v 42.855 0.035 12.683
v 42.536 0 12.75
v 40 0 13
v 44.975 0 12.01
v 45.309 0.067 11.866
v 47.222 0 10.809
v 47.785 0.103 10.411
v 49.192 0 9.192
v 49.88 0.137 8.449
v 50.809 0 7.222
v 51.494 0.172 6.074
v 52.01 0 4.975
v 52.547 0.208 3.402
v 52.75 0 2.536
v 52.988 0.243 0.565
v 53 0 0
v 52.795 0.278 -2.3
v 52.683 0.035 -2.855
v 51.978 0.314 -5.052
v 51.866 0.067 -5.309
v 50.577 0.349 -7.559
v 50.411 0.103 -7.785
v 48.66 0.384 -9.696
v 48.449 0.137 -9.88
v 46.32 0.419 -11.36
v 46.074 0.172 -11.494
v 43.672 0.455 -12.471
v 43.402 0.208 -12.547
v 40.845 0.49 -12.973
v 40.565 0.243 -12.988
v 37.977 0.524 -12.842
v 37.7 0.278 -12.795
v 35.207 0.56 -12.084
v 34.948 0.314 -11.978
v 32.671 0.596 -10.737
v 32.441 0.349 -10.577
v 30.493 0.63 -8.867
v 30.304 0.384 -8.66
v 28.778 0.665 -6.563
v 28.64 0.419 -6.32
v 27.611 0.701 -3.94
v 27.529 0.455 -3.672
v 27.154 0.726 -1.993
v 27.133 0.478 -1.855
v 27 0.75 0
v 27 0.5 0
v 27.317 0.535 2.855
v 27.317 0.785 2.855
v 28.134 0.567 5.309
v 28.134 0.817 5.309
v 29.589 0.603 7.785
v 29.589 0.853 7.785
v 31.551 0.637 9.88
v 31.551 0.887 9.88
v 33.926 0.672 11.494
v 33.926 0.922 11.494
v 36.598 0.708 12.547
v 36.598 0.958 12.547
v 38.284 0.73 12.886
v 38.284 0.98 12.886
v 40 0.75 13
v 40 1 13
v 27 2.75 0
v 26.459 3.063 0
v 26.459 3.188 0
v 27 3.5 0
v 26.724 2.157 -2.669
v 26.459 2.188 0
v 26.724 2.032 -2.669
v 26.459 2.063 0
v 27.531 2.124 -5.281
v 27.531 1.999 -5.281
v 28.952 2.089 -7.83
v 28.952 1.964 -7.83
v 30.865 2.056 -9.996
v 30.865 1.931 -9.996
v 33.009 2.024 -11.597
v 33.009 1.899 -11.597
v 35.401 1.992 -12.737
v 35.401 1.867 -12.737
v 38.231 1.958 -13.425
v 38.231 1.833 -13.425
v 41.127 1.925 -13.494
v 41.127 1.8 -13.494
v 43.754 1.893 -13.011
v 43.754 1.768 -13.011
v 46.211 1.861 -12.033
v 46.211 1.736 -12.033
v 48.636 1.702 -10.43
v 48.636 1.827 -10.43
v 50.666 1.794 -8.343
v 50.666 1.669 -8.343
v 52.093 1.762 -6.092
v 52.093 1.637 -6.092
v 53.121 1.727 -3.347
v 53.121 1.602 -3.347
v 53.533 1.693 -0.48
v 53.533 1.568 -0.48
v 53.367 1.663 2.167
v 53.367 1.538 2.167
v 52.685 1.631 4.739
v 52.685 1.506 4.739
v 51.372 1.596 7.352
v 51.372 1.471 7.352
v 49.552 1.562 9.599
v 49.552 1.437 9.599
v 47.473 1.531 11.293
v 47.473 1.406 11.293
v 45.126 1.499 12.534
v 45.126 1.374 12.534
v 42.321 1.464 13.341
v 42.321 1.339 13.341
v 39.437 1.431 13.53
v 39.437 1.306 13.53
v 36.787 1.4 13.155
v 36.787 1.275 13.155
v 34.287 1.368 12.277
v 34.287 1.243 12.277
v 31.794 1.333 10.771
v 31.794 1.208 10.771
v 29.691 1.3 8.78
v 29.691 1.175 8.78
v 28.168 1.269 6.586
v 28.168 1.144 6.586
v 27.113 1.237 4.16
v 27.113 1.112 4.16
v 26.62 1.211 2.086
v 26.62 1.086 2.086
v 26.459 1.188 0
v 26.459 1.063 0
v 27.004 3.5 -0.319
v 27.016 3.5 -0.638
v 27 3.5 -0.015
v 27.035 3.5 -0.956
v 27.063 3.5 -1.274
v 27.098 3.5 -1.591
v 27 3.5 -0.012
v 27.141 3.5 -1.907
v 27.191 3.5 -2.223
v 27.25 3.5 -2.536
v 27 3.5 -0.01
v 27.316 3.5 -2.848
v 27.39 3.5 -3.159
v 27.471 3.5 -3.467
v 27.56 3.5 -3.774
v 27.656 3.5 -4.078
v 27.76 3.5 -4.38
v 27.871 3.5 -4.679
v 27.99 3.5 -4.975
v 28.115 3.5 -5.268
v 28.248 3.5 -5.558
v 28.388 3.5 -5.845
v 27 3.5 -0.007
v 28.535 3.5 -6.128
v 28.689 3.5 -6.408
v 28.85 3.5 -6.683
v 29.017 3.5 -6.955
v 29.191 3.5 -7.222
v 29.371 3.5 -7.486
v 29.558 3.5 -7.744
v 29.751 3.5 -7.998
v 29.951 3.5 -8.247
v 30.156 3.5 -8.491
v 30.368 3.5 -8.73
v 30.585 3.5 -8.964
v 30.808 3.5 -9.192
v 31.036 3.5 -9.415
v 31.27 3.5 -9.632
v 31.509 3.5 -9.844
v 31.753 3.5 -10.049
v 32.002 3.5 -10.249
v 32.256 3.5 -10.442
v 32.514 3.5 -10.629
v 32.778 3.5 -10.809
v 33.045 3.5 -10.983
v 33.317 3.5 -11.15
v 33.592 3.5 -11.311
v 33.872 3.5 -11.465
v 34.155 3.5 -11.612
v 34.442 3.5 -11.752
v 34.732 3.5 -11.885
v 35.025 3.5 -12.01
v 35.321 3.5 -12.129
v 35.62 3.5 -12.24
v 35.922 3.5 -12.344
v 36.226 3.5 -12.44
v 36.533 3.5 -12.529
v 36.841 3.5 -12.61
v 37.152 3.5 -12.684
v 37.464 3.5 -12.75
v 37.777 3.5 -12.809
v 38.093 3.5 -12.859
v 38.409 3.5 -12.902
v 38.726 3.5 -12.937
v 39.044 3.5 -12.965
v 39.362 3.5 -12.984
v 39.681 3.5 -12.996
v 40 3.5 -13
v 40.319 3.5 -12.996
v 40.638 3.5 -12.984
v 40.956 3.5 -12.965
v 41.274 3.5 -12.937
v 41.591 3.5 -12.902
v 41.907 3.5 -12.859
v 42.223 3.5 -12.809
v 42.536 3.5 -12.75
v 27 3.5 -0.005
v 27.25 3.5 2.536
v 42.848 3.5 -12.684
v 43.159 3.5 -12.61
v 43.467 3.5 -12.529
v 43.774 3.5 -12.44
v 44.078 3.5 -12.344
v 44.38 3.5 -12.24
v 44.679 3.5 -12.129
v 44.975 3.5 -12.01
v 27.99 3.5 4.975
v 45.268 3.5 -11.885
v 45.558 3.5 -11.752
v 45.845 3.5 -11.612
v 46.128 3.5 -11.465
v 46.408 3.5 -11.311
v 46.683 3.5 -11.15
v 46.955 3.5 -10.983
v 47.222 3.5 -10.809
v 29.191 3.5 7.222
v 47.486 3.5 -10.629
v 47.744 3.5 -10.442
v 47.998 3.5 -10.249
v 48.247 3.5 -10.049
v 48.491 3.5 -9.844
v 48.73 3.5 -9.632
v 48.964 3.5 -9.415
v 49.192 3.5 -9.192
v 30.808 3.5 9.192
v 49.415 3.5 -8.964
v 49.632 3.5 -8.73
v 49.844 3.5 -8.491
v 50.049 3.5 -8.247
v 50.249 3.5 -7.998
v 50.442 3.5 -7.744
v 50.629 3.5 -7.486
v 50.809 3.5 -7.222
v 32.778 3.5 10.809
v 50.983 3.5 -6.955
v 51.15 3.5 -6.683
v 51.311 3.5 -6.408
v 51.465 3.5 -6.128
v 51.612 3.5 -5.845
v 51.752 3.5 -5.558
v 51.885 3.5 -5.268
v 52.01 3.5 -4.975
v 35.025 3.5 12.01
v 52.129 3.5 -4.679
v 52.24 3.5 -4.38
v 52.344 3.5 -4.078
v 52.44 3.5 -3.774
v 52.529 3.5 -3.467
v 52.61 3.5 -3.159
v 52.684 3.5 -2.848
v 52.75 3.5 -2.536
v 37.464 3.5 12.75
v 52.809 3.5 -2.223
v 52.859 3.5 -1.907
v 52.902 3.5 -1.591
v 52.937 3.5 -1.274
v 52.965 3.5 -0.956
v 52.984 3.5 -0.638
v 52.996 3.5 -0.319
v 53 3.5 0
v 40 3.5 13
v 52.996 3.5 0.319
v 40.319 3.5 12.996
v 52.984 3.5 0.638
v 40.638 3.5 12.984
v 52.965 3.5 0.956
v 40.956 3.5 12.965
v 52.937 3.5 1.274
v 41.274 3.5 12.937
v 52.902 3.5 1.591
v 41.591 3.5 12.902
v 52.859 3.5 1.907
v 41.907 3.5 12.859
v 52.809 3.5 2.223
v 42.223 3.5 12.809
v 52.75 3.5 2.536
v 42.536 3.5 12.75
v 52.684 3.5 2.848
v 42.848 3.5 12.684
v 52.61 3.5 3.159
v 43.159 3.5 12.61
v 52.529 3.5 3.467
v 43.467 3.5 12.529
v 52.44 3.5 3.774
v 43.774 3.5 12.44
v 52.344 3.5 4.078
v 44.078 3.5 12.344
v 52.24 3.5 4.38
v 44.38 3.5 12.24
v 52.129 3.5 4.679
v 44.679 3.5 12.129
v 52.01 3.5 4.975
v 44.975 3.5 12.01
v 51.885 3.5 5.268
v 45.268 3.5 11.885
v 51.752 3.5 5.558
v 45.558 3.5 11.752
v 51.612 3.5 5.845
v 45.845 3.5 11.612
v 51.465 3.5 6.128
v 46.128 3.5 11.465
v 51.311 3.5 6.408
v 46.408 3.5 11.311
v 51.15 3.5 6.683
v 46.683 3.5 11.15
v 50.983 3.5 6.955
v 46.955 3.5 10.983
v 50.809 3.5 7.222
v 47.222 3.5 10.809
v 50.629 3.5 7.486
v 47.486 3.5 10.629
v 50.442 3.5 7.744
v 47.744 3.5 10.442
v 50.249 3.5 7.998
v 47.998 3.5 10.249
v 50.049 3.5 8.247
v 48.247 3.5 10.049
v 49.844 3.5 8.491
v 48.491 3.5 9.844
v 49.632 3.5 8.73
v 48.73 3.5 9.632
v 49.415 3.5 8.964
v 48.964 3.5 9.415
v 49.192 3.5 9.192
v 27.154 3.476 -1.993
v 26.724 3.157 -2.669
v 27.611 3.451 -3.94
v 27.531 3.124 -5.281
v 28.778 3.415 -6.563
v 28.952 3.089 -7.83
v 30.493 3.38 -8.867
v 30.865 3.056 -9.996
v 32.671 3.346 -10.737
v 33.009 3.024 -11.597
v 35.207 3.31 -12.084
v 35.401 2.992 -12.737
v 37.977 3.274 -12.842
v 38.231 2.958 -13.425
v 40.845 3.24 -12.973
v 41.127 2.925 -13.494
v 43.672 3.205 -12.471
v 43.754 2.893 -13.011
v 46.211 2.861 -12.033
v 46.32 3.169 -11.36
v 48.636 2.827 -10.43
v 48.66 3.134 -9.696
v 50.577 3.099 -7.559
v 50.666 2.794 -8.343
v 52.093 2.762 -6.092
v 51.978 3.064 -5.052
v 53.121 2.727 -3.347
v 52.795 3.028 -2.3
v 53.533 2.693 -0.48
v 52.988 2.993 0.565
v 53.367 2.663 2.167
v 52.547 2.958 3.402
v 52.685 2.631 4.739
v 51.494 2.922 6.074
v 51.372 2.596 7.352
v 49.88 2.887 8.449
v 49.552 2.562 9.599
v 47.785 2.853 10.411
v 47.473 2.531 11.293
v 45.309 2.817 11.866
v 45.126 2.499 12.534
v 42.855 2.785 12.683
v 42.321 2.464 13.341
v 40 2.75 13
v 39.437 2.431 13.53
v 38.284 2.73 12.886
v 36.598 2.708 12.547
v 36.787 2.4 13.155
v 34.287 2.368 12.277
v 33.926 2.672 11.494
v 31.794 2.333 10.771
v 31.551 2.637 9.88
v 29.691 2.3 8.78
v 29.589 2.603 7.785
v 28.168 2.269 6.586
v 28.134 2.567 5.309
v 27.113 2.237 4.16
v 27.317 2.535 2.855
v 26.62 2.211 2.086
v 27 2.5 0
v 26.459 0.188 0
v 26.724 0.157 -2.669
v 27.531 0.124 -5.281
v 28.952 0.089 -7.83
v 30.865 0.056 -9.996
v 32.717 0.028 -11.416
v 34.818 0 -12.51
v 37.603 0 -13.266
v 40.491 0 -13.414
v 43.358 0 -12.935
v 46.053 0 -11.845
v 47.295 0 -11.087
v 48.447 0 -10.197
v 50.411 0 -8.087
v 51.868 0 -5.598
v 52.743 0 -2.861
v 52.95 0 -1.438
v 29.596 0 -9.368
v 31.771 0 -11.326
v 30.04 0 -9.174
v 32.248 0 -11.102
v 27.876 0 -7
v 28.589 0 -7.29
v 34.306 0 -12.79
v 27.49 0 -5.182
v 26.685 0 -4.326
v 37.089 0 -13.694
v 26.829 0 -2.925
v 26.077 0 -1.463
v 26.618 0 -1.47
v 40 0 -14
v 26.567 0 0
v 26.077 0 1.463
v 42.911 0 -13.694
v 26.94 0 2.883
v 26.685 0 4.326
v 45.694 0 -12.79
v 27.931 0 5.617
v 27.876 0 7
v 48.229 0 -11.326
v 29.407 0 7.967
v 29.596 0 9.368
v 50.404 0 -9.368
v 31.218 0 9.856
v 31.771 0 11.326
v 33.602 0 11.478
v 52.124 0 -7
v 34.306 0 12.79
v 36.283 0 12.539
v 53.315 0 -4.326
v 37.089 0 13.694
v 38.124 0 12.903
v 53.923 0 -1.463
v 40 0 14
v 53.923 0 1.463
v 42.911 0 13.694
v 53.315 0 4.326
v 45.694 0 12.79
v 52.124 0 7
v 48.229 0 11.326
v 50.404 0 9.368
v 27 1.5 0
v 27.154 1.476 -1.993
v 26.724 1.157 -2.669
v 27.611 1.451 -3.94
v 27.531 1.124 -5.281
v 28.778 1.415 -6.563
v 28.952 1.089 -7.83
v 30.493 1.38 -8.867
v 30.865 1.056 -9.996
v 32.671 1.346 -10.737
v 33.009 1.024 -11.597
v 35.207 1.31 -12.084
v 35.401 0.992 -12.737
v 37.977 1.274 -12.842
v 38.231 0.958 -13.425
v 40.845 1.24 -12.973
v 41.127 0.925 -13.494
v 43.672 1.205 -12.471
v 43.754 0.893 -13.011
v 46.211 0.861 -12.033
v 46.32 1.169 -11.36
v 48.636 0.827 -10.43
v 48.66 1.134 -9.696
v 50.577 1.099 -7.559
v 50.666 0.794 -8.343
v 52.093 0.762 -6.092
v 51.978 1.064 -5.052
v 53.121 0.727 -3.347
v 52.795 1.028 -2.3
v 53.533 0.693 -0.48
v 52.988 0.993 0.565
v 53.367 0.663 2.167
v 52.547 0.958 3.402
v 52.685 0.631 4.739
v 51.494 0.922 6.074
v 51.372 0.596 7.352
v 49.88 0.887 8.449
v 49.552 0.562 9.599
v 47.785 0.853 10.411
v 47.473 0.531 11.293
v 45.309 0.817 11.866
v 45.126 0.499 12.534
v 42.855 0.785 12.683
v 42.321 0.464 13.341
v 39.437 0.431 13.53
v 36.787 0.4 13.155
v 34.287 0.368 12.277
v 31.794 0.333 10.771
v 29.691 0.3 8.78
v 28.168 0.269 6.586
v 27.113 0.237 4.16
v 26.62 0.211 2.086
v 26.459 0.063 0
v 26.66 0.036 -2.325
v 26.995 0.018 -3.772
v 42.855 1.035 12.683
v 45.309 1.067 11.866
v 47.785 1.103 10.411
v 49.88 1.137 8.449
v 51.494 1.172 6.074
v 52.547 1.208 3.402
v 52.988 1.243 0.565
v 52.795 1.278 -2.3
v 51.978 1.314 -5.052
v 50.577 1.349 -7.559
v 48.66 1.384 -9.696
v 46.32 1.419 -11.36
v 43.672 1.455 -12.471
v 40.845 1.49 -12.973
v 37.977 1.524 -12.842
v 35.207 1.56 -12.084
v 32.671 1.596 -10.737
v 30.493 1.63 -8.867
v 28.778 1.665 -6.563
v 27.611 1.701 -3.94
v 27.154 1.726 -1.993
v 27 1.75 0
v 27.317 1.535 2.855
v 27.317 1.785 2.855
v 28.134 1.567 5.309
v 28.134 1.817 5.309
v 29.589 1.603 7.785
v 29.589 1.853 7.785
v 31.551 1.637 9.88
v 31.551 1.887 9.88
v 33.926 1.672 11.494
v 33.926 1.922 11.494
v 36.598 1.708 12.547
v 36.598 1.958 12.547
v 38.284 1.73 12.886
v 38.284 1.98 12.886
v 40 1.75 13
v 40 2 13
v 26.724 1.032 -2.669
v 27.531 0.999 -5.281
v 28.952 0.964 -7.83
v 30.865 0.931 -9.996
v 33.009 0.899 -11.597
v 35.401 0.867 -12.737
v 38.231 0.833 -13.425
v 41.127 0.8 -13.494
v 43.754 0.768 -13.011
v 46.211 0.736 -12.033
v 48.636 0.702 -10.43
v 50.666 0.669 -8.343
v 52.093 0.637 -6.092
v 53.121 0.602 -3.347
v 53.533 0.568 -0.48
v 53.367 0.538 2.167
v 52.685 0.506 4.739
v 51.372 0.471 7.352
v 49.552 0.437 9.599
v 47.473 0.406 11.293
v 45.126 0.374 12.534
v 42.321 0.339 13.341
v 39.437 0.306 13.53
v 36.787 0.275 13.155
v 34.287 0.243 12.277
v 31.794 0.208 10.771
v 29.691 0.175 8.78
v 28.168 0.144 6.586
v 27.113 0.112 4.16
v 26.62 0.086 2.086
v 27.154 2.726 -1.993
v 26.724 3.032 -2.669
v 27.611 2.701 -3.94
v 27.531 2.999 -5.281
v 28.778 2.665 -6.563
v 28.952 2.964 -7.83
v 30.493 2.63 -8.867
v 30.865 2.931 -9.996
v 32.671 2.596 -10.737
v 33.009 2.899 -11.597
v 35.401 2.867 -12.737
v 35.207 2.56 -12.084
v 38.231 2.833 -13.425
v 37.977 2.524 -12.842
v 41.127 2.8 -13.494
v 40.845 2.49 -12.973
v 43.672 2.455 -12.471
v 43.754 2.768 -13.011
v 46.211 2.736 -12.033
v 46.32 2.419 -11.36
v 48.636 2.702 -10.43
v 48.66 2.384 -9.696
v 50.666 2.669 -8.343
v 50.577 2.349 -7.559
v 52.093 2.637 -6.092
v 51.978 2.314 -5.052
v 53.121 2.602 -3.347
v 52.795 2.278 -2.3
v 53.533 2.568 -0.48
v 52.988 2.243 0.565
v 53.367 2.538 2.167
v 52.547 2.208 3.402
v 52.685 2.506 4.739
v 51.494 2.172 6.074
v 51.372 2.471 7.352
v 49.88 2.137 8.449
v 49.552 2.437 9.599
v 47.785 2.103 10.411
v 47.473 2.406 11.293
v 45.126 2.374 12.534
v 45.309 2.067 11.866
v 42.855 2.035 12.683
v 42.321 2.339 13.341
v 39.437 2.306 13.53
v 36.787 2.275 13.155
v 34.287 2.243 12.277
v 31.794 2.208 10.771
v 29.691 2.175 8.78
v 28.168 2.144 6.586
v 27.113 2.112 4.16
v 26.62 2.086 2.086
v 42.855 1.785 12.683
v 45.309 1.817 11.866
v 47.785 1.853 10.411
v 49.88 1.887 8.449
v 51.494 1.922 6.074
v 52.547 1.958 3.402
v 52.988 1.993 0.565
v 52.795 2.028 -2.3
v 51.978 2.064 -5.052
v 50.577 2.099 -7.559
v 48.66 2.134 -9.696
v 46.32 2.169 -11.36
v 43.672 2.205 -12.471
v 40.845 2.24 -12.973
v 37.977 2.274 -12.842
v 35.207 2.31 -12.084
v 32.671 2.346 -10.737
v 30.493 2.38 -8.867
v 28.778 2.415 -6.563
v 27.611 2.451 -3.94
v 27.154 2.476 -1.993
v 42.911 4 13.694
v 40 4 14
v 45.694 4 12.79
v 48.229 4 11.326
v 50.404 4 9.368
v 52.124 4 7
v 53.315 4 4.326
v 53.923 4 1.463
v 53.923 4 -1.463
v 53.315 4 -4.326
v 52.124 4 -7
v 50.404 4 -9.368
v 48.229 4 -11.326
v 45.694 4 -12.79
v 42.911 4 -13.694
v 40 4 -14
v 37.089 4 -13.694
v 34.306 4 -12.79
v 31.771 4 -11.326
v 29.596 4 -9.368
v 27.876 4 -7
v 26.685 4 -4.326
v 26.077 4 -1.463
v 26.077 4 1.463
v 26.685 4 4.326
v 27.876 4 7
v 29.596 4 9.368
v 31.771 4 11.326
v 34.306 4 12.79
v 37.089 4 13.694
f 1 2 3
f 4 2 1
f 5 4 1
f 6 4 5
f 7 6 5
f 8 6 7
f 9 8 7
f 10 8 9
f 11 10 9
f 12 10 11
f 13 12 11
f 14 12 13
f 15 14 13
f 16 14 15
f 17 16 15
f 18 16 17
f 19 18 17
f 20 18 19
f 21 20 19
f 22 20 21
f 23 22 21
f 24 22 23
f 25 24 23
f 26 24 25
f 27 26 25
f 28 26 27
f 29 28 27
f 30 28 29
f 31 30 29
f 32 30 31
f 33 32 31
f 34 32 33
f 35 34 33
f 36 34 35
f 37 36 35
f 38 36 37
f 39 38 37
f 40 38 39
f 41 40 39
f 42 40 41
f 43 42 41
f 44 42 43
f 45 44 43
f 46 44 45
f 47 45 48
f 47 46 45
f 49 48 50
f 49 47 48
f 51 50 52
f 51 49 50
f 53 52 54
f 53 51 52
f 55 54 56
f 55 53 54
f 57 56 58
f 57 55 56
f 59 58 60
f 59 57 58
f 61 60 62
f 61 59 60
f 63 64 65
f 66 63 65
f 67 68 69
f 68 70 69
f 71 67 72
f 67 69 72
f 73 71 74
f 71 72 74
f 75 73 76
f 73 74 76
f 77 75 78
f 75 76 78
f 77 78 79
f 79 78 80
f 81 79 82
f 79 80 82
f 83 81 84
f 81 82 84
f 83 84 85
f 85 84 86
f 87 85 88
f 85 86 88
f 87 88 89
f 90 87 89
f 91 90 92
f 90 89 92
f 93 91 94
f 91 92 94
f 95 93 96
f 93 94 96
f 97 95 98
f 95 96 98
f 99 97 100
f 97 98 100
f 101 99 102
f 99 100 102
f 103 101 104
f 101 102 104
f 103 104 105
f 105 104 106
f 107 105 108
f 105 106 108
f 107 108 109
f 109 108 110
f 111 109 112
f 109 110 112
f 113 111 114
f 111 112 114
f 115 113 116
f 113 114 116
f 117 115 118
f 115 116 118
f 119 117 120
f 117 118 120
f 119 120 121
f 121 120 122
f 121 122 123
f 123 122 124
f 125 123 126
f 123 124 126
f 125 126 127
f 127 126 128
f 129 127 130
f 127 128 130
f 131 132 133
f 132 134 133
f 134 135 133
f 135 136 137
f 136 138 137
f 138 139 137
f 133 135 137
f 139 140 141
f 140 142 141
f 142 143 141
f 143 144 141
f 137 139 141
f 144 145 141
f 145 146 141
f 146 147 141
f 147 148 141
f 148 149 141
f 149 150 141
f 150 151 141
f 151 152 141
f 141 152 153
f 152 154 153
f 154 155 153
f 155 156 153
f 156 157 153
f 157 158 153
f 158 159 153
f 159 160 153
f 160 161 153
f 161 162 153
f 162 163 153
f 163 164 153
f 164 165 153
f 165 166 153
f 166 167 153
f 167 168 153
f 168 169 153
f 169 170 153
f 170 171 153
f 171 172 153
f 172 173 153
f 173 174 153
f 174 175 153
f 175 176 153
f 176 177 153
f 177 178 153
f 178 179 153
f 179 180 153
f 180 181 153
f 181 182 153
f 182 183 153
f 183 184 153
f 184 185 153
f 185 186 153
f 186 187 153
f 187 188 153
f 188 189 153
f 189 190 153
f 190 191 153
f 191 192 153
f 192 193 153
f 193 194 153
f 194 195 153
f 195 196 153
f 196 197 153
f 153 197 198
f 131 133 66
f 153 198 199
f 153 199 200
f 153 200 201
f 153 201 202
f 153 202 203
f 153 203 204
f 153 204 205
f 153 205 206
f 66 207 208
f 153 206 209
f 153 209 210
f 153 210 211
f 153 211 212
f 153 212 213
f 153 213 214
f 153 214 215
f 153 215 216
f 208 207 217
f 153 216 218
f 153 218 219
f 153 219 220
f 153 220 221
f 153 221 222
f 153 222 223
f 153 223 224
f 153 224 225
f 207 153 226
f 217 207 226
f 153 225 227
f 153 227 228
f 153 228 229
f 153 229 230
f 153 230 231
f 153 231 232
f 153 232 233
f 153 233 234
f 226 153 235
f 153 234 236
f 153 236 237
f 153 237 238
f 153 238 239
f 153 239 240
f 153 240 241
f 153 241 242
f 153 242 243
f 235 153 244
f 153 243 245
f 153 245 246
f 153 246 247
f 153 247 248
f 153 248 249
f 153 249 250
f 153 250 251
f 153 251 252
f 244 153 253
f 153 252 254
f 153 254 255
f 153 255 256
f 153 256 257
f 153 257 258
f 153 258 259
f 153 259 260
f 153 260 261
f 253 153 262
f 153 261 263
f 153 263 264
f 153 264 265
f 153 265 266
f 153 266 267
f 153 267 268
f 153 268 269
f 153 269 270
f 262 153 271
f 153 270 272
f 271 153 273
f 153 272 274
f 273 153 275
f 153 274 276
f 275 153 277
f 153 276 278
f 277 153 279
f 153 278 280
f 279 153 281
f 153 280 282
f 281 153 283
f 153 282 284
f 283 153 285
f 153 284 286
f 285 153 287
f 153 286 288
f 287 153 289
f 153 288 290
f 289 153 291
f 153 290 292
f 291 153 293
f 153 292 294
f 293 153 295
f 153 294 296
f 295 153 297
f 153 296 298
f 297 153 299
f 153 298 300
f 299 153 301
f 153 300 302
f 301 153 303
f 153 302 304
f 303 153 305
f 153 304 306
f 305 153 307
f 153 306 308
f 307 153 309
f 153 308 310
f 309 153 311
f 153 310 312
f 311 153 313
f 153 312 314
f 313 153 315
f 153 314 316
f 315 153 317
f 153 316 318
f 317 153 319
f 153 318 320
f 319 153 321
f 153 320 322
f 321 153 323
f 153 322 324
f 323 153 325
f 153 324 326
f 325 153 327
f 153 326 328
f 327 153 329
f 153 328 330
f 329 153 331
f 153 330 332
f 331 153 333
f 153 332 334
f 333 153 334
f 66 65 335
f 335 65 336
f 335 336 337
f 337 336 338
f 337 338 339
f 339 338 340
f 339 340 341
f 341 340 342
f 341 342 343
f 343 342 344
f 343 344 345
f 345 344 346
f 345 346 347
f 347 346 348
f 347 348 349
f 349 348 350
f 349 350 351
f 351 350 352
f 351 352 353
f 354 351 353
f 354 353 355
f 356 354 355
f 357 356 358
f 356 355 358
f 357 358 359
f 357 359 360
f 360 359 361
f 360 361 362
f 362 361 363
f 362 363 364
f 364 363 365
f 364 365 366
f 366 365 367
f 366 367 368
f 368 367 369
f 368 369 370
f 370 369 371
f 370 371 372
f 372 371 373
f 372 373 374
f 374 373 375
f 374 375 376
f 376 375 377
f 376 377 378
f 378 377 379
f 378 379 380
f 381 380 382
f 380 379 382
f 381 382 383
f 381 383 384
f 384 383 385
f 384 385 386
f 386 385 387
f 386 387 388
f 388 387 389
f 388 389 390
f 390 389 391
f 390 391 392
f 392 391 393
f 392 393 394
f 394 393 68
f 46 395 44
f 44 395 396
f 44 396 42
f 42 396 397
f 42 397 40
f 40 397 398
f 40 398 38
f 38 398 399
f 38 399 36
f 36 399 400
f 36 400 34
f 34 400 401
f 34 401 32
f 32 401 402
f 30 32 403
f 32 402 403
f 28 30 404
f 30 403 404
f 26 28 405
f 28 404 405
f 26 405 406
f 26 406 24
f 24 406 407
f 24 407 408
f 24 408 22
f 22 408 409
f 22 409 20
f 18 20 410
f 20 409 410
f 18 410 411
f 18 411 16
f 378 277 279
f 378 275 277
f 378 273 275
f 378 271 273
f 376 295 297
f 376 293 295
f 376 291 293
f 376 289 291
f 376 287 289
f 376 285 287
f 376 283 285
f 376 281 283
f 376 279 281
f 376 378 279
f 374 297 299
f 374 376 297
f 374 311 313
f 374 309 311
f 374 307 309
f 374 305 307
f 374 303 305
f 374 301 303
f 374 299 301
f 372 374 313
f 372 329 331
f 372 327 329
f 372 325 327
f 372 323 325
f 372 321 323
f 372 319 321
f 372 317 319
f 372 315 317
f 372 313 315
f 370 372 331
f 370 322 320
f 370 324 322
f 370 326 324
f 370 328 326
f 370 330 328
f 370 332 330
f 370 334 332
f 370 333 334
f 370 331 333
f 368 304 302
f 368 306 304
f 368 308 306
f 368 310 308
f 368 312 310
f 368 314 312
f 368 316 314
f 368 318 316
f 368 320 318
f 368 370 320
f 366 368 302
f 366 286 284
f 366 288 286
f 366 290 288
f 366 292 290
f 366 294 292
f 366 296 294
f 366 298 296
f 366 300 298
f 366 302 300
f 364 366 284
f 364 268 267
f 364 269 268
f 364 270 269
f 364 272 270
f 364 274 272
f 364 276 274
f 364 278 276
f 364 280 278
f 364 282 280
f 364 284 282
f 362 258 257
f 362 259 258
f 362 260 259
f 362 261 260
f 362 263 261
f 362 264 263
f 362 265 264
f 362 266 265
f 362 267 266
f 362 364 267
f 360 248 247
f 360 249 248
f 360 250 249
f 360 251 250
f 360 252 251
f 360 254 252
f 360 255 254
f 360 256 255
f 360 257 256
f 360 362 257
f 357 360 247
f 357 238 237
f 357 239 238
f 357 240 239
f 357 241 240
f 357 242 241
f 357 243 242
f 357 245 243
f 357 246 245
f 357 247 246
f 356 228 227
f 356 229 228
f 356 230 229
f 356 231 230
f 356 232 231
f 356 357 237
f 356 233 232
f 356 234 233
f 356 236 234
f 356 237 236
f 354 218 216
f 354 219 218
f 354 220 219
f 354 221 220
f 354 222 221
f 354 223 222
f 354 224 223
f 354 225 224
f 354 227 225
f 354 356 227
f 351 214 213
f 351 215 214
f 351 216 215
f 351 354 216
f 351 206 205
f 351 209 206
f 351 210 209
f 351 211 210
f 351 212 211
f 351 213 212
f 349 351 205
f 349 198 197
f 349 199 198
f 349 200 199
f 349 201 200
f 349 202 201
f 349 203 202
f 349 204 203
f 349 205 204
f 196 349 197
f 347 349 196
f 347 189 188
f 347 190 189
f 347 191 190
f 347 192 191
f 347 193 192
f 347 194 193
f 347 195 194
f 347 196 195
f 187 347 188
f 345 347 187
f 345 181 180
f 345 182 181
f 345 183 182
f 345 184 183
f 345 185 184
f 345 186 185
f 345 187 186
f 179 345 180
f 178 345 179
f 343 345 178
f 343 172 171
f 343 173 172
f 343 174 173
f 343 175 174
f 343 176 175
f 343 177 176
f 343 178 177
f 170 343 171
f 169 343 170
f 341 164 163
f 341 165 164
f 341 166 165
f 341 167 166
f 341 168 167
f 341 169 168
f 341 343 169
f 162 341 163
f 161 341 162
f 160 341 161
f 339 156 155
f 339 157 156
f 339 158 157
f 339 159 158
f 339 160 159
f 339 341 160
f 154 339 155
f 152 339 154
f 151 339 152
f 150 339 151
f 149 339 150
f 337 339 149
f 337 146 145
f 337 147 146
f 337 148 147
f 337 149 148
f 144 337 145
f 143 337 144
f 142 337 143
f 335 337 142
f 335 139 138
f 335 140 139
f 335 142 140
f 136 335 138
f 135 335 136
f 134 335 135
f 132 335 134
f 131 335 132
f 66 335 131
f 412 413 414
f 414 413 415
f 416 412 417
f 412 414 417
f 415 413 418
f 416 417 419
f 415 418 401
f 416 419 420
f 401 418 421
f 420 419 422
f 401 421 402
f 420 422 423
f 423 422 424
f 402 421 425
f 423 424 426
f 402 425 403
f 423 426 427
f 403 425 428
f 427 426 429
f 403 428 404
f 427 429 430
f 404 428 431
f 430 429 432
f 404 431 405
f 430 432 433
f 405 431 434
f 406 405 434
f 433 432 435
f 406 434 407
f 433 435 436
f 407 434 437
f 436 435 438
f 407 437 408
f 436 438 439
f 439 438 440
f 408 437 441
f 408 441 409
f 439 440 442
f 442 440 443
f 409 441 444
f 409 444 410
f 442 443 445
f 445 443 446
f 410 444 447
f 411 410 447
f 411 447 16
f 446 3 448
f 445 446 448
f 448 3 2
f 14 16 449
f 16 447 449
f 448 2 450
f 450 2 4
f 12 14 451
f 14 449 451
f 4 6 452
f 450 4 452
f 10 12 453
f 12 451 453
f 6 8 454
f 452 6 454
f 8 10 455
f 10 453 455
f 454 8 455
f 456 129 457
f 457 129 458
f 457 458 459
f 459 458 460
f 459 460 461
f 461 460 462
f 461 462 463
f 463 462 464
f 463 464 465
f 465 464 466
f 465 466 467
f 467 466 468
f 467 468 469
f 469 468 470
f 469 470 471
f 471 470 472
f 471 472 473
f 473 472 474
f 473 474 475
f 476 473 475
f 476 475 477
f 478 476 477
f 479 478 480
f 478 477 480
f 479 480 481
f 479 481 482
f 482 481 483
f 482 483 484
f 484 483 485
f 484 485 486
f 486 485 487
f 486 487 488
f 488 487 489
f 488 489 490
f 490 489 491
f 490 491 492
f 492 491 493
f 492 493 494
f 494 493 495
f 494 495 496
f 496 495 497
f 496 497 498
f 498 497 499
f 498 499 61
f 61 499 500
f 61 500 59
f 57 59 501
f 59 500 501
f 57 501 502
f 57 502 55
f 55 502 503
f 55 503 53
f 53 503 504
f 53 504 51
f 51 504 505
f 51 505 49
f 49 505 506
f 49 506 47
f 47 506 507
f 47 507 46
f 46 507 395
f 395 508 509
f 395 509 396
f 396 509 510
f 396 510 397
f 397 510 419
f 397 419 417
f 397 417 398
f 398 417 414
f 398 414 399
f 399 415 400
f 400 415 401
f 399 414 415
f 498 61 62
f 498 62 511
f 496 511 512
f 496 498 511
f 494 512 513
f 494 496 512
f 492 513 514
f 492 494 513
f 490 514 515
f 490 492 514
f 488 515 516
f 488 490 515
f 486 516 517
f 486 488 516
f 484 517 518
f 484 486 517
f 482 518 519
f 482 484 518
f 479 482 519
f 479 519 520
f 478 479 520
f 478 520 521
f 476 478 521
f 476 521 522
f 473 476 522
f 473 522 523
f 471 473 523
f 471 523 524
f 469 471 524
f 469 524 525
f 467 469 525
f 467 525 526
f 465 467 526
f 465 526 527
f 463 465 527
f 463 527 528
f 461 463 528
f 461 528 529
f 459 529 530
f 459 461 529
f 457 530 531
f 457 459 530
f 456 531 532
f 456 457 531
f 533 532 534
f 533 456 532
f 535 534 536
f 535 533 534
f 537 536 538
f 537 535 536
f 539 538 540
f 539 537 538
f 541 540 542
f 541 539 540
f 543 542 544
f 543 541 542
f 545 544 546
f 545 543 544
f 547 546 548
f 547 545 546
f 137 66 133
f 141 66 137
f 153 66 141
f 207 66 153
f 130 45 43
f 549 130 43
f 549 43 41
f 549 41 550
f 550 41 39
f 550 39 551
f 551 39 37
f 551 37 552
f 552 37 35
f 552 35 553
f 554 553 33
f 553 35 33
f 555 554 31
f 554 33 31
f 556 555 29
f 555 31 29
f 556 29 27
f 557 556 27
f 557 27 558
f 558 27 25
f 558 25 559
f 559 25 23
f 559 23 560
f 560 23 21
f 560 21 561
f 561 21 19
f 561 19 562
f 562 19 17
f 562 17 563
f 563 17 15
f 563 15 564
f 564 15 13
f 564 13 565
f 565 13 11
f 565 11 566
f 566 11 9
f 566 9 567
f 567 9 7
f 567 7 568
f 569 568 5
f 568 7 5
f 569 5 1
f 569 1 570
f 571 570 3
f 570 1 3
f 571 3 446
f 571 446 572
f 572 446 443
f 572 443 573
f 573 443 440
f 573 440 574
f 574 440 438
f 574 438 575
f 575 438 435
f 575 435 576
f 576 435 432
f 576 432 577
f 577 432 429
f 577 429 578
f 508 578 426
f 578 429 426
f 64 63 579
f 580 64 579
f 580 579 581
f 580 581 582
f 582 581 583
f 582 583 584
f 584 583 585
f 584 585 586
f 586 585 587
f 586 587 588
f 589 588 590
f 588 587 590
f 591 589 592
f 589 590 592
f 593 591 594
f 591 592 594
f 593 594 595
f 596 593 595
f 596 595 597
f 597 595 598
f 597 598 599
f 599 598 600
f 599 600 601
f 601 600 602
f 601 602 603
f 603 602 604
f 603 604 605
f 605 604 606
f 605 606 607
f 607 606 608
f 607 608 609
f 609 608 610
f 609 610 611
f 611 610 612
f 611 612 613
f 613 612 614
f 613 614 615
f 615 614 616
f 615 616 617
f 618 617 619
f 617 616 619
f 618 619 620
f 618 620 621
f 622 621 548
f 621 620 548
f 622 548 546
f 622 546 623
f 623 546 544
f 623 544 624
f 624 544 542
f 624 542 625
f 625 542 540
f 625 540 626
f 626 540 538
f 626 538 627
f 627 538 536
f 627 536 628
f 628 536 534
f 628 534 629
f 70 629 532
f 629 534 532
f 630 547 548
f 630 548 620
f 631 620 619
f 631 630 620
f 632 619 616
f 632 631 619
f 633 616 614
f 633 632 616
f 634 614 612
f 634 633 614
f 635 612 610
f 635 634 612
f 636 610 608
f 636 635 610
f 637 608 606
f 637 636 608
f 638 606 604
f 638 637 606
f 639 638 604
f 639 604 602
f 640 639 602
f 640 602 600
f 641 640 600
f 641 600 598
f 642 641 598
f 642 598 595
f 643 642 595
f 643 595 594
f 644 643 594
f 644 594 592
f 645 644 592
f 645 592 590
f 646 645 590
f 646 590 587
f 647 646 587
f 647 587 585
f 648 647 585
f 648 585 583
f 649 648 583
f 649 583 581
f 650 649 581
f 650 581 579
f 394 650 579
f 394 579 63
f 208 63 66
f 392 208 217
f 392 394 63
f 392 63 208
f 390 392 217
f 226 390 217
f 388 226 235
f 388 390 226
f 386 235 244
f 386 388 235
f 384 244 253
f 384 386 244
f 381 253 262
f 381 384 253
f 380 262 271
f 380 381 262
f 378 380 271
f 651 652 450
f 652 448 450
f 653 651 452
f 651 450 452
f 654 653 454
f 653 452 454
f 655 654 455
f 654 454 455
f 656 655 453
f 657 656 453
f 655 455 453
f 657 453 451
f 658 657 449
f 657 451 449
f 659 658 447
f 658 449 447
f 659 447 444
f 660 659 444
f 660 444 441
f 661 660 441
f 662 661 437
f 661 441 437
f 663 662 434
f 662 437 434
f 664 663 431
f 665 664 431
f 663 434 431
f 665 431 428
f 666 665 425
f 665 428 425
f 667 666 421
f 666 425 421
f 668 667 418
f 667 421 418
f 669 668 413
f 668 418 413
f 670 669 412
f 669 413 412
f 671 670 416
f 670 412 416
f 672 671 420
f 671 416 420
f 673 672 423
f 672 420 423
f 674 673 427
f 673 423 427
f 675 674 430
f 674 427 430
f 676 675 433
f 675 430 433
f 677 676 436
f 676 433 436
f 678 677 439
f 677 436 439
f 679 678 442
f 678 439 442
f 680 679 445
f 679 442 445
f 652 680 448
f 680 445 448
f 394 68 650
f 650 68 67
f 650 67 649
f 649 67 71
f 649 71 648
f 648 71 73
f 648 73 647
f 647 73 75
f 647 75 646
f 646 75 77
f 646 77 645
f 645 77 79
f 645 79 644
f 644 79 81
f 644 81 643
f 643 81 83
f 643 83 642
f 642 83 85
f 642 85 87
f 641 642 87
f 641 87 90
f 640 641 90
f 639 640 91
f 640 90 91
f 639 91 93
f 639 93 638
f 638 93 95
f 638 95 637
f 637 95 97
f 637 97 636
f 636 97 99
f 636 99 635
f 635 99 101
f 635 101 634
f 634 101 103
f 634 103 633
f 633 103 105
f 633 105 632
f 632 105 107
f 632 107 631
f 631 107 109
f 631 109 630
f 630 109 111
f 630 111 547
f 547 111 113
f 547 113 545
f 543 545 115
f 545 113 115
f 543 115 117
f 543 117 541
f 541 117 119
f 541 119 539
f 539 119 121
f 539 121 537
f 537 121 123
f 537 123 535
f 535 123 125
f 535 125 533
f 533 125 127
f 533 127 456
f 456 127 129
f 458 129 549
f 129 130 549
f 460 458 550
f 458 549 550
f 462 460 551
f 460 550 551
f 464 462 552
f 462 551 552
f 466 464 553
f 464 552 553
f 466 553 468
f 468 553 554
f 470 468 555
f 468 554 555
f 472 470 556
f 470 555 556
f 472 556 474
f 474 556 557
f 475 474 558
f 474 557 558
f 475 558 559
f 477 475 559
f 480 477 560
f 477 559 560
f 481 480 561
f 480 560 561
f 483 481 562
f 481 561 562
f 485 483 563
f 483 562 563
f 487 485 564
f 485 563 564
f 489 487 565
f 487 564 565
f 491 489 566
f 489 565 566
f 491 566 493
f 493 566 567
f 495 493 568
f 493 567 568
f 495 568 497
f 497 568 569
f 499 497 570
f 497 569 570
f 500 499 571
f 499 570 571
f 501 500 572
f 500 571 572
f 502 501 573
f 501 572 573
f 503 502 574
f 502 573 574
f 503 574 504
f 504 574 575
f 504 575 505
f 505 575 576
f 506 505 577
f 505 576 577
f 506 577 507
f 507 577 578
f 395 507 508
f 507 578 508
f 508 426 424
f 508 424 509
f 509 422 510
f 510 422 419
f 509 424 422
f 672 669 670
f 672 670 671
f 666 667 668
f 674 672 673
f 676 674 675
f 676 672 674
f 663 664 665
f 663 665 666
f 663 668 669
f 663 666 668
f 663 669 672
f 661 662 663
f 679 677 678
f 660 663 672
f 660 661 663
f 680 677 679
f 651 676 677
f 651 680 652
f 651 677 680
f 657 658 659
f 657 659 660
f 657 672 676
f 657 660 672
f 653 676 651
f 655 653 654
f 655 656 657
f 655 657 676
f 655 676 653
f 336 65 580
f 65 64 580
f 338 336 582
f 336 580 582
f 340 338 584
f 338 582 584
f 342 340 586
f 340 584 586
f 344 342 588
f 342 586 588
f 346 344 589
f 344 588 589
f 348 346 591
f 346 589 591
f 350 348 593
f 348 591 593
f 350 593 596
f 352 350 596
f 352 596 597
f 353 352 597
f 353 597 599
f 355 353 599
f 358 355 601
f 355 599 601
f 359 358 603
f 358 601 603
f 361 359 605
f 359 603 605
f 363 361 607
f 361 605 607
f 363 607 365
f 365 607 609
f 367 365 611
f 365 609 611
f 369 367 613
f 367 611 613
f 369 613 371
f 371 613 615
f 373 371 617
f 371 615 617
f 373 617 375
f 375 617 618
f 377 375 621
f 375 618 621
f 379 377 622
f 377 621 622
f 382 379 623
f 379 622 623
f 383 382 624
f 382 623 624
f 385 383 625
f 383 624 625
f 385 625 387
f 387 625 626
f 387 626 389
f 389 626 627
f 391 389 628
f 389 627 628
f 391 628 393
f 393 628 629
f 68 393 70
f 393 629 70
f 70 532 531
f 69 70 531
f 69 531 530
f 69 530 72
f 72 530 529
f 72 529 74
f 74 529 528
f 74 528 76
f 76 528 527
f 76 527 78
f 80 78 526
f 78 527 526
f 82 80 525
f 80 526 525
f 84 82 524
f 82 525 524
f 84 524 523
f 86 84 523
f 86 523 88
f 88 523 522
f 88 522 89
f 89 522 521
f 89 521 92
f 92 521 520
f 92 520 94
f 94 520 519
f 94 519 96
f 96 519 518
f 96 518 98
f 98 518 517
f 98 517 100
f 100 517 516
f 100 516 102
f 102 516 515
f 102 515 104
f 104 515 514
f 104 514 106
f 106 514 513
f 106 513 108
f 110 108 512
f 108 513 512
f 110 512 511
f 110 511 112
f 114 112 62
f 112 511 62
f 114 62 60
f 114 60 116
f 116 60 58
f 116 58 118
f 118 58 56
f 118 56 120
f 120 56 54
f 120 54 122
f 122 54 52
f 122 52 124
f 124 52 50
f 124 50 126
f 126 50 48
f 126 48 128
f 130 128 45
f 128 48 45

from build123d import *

# Parameters (mm, degrees)
SKETCH7_R           = 14
SKETCH7_R_2         = 13
BOSS_EXTRUDE2_DEPTH = 4
BOSS_EXTRUDE6_START = 3.5
SKETCH7_3_R         = 14
BOSS_EXTRUDE6_DEPTH = 0.5
THREAD3_PITCH       = 1


with BuildPart() as part:
    # Sketch7 → Boss-Extrude2 (new body)
    with BuildSketch(Plane(origin=(0, 0, 0), x_dir=(1, 0, 0), z_dir=(0, 1, 0))):
        with Locations(Location((40, 0, 0), (0, 0, 270))):
            Circle(SKETCH7_R)
        with Locations(Location((40, 0, 0), (0, 0, 270))):
            Circle(SKETCH7_R_2, mode=Mode.SUBTRACT)
    extrude(amount=BOSS_EXTRUDE2_DEPTH)

    # Sketch7<3> → Boss-Extrude6 (add)
    with BuildSketch(Plane(origin=(0, 0, 0), x_dir=(1, 0, 0), z_dir=(0, 1, 0)).offset(BOSS_EXTRUDE6_START)):
        with Locations(Location((40, 0, 0), (0, 0, 270))):
            Circle(SKETCH7_3_R)
    extrude(amount=BOSS_EXTRUDE6_DEPTH)

    # Thread3: arcs per turn and ends read off the stored shape
    # Thread3: the profile of Thread Profile3 profile screwed along a right-hand helix through 4 turns, 8 arcs to a turn; built about Z, then put on its axis
    thread3_z = Axis((0, 0, 0), (0, 0, 1))
    thread3_corners = [(12.9997, 0, -0.000173205), (13.541265875, 0, 0.312499999), (13.541265875, 0, 0.437499999), (12.9997, 0, 0.750173202)]
    with BuildLine(mode=Mode.PRIVATE) as thread3_profile:
        Line(thread3_corners[0], thread3_corners[1])
        Line(thread3_corners[1], thread3_corners[2])
        Line(thread3_corners[2], thread3_corners[3])
        Line(thread3_corners[3], thread3_corners[0])
    thread3_cap = Face(thread3_profile.wire())
    thread3_turn_angles = [0, 22.5, 45, 67.5, 90, 112.5, 135, 157.5, 180, 202.5, 225, 247.5, 270, 292.5, 315, 337.5, 360]
    thread3_turn_weights = [1, 0.9238795325112867, 1, 0.9238795325112867, 1, 0.9238795325112867, 1, 0.9238795325112867, 1, 0.9238795325112867, 1, 0.9238795325112867, 1, 0.9238795325112867, 1, 0.9238795325112867, 1]
    thread3_turn_rails = [Edge.make_bspline([Vector(p[0], p[1], 0).rotate(thread3_z, thread3_turn_angles[k]) / thread3_turn_weights[k] + Vector(0, 0, p[2] + THREAD3_PITCH * thread3_turn_angles[k] / 360) for k in range(17)], [0, 0, 0, 1, 1, 2, 2, 3, 3, 4, 4, 5, 5, 6, 6, 7, 7, 8, 8, 8], 2, thread3_turn_weights) for p in thread3_corners]
    thread3_turn_sides = [Face.make_surface_from_curves(thread3_turn_rails[p[0]], thread3_turn_rails[p[1]]) for p in [(0, 1), (1, 2), (2, 3), (3, 0)]]
    thread3 = Plane(origin=(40, 3.5, 0), x_dir=(-1, 0, 0), z_dir=(0, -1, 0)) * Solid(Shell([*[p.moved(Location((0, 0, THREAD3_PITCH * i))) for i in range(4) for p in thread3_turn_sides], thread3_cap, thread3_cap.rotate(thread3_z, 1440).moved(Location((0, 0, THREAD3_PITCH * 1440 / 360)))]))
    add(thread3, mode=Mode.SUBTRACT)


solid = part.part
